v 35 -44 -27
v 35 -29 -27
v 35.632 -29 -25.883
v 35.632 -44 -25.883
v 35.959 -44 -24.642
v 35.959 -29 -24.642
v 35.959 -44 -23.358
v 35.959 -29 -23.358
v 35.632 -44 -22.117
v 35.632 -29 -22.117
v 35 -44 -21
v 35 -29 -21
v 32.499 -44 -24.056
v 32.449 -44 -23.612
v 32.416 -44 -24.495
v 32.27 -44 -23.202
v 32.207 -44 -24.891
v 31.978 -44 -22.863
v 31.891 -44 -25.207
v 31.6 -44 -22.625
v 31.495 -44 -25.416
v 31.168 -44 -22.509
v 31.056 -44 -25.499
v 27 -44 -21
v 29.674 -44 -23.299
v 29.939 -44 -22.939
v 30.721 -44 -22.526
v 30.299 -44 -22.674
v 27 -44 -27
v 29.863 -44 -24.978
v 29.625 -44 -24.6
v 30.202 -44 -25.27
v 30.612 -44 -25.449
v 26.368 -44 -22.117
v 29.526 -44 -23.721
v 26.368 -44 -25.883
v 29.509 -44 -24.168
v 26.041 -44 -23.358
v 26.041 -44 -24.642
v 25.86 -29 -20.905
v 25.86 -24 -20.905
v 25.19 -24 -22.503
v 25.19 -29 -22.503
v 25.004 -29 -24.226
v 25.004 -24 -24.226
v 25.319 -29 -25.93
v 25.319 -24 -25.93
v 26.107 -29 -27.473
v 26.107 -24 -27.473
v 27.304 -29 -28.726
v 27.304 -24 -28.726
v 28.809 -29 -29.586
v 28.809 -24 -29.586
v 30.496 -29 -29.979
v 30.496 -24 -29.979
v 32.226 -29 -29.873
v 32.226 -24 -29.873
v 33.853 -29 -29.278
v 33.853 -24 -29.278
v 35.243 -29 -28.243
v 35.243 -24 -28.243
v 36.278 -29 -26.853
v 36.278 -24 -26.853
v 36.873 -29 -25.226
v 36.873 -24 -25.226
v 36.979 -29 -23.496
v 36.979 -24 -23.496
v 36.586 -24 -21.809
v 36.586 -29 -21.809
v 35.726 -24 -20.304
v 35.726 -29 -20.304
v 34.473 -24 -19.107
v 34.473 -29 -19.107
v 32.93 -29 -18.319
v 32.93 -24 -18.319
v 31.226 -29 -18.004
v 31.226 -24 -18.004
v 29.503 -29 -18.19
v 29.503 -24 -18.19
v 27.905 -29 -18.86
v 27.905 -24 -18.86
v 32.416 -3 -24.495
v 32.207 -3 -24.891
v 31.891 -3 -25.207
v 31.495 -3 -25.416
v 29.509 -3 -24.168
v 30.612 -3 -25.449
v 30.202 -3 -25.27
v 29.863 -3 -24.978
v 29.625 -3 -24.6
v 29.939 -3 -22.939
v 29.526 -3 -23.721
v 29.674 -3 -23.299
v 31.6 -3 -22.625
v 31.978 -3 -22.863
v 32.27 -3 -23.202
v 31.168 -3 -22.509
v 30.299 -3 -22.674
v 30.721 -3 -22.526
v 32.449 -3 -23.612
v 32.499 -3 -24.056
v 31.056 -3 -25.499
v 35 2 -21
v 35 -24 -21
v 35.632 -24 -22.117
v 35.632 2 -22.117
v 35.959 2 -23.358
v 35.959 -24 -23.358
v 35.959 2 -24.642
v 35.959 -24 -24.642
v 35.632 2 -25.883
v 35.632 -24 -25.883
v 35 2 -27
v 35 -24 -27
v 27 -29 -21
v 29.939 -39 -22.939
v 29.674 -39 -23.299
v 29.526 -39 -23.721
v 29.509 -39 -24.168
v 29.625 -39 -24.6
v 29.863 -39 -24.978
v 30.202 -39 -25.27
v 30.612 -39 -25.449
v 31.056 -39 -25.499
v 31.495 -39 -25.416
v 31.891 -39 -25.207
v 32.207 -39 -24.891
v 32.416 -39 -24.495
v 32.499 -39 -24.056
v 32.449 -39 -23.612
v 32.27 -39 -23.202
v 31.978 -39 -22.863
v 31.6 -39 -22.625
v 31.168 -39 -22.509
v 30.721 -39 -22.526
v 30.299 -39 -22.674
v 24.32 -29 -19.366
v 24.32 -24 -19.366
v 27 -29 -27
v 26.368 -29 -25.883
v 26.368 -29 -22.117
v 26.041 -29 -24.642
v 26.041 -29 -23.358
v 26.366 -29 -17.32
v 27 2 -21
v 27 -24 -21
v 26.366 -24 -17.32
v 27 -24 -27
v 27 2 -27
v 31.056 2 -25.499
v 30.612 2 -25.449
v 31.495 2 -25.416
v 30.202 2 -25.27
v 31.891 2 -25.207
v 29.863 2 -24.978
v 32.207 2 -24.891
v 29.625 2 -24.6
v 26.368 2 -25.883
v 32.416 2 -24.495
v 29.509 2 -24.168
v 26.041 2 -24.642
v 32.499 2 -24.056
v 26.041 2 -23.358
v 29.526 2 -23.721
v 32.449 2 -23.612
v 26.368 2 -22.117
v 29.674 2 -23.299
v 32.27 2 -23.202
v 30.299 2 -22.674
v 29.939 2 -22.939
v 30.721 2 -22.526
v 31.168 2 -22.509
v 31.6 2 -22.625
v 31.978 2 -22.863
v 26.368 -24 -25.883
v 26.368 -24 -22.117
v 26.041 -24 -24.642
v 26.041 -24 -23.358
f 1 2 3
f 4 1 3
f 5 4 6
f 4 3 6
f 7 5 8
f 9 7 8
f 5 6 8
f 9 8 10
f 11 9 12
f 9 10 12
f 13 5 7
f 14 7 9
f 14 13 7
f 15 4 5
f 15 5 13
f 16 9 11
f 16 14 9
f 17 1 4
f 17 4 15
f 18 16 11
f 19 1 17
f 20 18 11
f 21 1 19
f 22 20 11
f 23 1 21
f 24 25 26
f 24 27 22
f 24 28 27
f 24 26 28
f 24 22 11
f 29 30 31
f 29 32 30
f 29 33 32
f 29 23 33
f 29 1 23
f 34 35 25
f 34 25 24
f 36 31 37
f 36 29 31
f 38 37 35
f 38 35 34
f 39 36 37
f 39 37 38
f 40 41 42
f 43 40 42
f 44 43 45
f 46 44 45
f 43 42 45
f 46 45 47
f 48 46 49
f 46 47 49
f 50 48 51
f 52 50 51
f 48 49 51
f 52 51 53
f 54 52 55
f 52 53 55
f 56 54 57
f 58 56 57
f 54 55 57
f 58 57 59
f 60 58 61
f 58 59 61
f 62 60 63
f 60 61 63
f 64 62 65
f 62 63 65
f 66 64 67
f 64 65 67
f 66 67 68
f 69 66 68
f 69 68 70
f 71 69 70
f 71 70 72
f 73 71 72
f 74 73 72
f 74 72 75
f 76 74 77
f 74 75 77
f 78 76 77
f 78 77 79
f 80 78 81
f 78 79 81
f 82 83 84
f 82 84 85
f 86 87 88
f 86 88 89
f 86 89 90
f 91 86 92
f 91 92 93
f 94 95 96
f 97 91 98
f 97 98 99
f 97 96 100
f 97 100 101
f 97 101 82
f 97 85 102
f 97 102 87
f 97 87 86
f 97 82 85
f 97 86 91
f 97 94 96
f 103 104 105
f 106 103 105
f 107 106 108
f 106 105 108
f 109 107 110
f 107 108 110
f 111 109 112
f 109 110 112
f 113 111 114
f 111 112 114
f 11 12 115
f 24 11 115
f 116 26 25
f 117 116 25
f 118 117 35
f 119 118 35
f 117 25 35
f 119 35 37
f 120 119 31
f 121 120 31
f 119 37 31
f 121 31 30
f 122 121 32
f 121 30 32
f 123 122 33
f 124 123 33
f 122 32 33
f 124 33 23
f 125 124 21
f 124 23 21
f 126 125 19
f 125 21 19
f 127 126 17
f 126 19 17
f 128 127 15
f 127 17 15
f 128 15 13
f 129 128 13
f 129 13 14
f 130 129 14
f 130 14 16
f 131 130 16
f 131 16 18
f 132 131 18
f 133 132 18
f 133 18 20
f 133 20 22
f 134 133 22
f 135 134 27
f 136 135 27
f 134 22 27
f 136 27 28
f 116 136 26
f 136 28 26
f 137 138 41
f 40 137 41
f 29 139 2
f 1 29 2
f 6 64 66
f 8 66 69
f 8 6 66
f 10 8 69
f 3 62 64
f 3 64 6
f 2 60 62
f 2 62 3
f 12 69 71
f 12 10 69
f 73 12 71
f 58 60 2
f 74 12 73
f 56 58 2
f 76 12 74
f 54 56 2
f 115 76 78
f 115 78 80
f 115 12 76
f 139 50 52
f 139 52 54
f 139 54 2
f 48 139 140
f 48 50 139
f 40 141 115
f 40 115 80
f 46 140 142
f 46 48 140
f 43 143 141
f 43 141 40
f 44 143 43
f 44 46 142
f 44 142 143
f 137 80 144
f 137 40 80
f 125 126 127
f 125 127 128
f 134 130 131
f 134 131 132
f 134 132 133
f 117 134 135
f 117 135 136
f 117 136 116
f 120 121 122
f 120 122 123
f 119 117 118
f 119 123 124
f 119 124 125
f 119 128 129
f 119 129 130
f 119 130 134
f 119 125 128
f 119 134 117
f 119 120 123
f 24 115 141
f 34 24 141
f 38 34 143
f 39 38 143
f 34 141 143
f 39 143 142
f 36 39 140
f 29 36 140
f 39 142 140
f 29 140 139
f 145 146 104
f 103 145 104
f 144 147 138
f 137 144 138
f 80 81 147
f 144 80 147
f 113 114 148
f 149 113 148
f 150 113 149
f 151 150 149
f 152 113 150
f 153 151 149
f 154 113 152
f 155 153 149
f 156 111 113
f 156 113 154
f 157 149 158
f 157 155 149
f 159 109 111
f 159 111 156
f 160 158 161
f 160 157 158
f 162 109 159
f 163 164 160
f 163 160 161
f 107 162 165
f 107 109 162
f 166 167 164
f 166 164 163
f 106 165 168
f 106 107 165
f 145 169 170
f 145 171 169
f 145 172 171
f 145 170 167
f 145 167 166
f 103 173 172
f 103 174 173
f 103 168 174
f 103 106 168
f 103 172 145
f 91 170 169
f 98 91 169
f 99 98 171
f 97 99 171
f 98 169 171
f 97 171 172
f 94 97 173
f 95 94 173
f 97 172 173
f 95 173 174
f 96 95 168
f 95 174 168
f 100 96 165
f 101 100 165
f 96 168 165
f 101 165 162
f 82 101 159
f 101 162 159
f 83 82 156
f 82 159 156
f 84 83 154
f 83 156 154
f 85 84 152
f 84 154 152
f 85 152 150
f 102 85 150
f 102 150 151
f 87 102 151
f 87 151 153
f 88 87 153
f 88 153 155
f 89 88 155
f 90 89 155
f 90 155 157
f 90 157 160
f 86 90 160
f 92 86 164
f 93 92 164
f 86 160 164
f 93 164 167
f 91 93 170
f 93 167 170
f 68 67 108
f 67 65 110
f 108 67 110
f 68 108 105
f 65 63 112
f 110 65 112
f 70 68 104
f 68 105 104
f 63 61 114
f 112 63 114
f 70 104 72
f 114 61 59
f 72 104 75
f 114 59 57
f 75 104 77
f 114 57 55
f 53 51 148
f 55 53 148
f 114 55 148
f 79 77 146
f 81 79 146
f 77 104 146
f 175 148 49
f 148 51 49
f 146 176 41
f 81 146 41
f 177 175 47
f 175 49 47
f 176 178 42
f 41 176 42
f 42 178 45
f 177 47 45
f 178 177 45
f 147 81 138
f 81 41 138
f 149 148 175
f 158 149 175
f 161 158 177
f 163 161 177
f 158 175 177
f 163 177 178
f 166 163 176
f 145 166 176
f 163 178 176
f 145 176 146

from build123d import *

# Parameters (mm, degrees)
PAD001_DEPTH            = 5
PAD002_DEPTH            = 26
PAD003_DEPTH            = 15
SKETCH016_R             = 1.5
POCKET005_DEPTH         = 5
SKETCH015_R             = 1.5
POCKET006_DEPTH         = 5
BODY002_PLACEMENT_ANGLE = 225


with BuildPart() as part:
    # Sketch004 → Pad001 (new body)
    with BuildSketch(Plane.XZ):
        with BuildLine():
            ThreePointArc((5.823017, 1.446538), (-6, 0), (5.823017, -1.446538))
            Line((5.823017, -1.446538), (8, -1.446538))
            Line((8, -1.446538), (8, 1.446538))
            Line((8, 1.446538), (5.823017, 1.446538))
        make_face()
    extrude(amount=PAD001_DEPTH)

    # Sketch005 (on Face5 of Pad001) → Pad002 (join)
    with BuildSketch(Plane(origin=(0, 0, 0), x_dir=(1, 0, 0), z_dir=(0, 1, 0))):
        with BuildLine():
            ThreePointArc((-0.707105, 4.949749), (-3.535534, 3.535535), (-4.949748, 0.707105))
            Line((-4.949748, 0.707105), (0.707107, -4.949746))
            ThreePointArc((0.707107, -4.949746), (3.535533, -3.535533), (4.949747, -0.707107))
            Line((4.949747, -0.707107), (-0.707105, 4.949749))
        make_face()
    extrude(amount=PAD002_DEPTH)

    # Sketch006 (on Face5 of Pad002) → Pad003 (join)
    with BuildSketch(Plane.XZ.offset(5)):
        with BuildLine():
            ThreePointArc((-4.949747, -0.707107), (-3.535534, -3.535534), (-0.707107, -4.949747))
            Line((-0.707107, -4.949747), (4.949748, 0.707105))
            ThreePointArc((4.949748, 0.707105), (3.535535, 3.535533), (0.707107, 4.949747))
            Line((0.707107, 4.949747), (-4.949747, -0.707107))
        make_face()
    extrude(amount=PAD003_DEPTH)

    # Sketch016 (on Face15 of Pad003) → Pocket005 (cut)
    with BuildSketch(Plane(origin=(0, 26, 0), x_dir=(1, 0, 0), z_dir=(0, 1, 0))):
        Circle(SKETCH016_R)
    extrude(amount=-POCKET005_DEPTH, mode=Mode.SUBTRACT)

    # Sketch015 (on Face16 of Pad003) → Pocket006 (cut)
    with BuildSketch(Plane.XZ.offset(20)):
        Circle(SKETCH015_R)
    extrude(amount=-POCKET006_DEPTH, mode=Mode.SUBTRACT)


with BuildPart() as part_1:
    # Body002 placement: moved
    add(part.part.moved(Location((31, -24, -24.000001))).rotate(Axis((31, -24, -24.000001), (0, 1, 0)), BODY002_PLACEMENT_ANGLE))


solid = part_1.part
